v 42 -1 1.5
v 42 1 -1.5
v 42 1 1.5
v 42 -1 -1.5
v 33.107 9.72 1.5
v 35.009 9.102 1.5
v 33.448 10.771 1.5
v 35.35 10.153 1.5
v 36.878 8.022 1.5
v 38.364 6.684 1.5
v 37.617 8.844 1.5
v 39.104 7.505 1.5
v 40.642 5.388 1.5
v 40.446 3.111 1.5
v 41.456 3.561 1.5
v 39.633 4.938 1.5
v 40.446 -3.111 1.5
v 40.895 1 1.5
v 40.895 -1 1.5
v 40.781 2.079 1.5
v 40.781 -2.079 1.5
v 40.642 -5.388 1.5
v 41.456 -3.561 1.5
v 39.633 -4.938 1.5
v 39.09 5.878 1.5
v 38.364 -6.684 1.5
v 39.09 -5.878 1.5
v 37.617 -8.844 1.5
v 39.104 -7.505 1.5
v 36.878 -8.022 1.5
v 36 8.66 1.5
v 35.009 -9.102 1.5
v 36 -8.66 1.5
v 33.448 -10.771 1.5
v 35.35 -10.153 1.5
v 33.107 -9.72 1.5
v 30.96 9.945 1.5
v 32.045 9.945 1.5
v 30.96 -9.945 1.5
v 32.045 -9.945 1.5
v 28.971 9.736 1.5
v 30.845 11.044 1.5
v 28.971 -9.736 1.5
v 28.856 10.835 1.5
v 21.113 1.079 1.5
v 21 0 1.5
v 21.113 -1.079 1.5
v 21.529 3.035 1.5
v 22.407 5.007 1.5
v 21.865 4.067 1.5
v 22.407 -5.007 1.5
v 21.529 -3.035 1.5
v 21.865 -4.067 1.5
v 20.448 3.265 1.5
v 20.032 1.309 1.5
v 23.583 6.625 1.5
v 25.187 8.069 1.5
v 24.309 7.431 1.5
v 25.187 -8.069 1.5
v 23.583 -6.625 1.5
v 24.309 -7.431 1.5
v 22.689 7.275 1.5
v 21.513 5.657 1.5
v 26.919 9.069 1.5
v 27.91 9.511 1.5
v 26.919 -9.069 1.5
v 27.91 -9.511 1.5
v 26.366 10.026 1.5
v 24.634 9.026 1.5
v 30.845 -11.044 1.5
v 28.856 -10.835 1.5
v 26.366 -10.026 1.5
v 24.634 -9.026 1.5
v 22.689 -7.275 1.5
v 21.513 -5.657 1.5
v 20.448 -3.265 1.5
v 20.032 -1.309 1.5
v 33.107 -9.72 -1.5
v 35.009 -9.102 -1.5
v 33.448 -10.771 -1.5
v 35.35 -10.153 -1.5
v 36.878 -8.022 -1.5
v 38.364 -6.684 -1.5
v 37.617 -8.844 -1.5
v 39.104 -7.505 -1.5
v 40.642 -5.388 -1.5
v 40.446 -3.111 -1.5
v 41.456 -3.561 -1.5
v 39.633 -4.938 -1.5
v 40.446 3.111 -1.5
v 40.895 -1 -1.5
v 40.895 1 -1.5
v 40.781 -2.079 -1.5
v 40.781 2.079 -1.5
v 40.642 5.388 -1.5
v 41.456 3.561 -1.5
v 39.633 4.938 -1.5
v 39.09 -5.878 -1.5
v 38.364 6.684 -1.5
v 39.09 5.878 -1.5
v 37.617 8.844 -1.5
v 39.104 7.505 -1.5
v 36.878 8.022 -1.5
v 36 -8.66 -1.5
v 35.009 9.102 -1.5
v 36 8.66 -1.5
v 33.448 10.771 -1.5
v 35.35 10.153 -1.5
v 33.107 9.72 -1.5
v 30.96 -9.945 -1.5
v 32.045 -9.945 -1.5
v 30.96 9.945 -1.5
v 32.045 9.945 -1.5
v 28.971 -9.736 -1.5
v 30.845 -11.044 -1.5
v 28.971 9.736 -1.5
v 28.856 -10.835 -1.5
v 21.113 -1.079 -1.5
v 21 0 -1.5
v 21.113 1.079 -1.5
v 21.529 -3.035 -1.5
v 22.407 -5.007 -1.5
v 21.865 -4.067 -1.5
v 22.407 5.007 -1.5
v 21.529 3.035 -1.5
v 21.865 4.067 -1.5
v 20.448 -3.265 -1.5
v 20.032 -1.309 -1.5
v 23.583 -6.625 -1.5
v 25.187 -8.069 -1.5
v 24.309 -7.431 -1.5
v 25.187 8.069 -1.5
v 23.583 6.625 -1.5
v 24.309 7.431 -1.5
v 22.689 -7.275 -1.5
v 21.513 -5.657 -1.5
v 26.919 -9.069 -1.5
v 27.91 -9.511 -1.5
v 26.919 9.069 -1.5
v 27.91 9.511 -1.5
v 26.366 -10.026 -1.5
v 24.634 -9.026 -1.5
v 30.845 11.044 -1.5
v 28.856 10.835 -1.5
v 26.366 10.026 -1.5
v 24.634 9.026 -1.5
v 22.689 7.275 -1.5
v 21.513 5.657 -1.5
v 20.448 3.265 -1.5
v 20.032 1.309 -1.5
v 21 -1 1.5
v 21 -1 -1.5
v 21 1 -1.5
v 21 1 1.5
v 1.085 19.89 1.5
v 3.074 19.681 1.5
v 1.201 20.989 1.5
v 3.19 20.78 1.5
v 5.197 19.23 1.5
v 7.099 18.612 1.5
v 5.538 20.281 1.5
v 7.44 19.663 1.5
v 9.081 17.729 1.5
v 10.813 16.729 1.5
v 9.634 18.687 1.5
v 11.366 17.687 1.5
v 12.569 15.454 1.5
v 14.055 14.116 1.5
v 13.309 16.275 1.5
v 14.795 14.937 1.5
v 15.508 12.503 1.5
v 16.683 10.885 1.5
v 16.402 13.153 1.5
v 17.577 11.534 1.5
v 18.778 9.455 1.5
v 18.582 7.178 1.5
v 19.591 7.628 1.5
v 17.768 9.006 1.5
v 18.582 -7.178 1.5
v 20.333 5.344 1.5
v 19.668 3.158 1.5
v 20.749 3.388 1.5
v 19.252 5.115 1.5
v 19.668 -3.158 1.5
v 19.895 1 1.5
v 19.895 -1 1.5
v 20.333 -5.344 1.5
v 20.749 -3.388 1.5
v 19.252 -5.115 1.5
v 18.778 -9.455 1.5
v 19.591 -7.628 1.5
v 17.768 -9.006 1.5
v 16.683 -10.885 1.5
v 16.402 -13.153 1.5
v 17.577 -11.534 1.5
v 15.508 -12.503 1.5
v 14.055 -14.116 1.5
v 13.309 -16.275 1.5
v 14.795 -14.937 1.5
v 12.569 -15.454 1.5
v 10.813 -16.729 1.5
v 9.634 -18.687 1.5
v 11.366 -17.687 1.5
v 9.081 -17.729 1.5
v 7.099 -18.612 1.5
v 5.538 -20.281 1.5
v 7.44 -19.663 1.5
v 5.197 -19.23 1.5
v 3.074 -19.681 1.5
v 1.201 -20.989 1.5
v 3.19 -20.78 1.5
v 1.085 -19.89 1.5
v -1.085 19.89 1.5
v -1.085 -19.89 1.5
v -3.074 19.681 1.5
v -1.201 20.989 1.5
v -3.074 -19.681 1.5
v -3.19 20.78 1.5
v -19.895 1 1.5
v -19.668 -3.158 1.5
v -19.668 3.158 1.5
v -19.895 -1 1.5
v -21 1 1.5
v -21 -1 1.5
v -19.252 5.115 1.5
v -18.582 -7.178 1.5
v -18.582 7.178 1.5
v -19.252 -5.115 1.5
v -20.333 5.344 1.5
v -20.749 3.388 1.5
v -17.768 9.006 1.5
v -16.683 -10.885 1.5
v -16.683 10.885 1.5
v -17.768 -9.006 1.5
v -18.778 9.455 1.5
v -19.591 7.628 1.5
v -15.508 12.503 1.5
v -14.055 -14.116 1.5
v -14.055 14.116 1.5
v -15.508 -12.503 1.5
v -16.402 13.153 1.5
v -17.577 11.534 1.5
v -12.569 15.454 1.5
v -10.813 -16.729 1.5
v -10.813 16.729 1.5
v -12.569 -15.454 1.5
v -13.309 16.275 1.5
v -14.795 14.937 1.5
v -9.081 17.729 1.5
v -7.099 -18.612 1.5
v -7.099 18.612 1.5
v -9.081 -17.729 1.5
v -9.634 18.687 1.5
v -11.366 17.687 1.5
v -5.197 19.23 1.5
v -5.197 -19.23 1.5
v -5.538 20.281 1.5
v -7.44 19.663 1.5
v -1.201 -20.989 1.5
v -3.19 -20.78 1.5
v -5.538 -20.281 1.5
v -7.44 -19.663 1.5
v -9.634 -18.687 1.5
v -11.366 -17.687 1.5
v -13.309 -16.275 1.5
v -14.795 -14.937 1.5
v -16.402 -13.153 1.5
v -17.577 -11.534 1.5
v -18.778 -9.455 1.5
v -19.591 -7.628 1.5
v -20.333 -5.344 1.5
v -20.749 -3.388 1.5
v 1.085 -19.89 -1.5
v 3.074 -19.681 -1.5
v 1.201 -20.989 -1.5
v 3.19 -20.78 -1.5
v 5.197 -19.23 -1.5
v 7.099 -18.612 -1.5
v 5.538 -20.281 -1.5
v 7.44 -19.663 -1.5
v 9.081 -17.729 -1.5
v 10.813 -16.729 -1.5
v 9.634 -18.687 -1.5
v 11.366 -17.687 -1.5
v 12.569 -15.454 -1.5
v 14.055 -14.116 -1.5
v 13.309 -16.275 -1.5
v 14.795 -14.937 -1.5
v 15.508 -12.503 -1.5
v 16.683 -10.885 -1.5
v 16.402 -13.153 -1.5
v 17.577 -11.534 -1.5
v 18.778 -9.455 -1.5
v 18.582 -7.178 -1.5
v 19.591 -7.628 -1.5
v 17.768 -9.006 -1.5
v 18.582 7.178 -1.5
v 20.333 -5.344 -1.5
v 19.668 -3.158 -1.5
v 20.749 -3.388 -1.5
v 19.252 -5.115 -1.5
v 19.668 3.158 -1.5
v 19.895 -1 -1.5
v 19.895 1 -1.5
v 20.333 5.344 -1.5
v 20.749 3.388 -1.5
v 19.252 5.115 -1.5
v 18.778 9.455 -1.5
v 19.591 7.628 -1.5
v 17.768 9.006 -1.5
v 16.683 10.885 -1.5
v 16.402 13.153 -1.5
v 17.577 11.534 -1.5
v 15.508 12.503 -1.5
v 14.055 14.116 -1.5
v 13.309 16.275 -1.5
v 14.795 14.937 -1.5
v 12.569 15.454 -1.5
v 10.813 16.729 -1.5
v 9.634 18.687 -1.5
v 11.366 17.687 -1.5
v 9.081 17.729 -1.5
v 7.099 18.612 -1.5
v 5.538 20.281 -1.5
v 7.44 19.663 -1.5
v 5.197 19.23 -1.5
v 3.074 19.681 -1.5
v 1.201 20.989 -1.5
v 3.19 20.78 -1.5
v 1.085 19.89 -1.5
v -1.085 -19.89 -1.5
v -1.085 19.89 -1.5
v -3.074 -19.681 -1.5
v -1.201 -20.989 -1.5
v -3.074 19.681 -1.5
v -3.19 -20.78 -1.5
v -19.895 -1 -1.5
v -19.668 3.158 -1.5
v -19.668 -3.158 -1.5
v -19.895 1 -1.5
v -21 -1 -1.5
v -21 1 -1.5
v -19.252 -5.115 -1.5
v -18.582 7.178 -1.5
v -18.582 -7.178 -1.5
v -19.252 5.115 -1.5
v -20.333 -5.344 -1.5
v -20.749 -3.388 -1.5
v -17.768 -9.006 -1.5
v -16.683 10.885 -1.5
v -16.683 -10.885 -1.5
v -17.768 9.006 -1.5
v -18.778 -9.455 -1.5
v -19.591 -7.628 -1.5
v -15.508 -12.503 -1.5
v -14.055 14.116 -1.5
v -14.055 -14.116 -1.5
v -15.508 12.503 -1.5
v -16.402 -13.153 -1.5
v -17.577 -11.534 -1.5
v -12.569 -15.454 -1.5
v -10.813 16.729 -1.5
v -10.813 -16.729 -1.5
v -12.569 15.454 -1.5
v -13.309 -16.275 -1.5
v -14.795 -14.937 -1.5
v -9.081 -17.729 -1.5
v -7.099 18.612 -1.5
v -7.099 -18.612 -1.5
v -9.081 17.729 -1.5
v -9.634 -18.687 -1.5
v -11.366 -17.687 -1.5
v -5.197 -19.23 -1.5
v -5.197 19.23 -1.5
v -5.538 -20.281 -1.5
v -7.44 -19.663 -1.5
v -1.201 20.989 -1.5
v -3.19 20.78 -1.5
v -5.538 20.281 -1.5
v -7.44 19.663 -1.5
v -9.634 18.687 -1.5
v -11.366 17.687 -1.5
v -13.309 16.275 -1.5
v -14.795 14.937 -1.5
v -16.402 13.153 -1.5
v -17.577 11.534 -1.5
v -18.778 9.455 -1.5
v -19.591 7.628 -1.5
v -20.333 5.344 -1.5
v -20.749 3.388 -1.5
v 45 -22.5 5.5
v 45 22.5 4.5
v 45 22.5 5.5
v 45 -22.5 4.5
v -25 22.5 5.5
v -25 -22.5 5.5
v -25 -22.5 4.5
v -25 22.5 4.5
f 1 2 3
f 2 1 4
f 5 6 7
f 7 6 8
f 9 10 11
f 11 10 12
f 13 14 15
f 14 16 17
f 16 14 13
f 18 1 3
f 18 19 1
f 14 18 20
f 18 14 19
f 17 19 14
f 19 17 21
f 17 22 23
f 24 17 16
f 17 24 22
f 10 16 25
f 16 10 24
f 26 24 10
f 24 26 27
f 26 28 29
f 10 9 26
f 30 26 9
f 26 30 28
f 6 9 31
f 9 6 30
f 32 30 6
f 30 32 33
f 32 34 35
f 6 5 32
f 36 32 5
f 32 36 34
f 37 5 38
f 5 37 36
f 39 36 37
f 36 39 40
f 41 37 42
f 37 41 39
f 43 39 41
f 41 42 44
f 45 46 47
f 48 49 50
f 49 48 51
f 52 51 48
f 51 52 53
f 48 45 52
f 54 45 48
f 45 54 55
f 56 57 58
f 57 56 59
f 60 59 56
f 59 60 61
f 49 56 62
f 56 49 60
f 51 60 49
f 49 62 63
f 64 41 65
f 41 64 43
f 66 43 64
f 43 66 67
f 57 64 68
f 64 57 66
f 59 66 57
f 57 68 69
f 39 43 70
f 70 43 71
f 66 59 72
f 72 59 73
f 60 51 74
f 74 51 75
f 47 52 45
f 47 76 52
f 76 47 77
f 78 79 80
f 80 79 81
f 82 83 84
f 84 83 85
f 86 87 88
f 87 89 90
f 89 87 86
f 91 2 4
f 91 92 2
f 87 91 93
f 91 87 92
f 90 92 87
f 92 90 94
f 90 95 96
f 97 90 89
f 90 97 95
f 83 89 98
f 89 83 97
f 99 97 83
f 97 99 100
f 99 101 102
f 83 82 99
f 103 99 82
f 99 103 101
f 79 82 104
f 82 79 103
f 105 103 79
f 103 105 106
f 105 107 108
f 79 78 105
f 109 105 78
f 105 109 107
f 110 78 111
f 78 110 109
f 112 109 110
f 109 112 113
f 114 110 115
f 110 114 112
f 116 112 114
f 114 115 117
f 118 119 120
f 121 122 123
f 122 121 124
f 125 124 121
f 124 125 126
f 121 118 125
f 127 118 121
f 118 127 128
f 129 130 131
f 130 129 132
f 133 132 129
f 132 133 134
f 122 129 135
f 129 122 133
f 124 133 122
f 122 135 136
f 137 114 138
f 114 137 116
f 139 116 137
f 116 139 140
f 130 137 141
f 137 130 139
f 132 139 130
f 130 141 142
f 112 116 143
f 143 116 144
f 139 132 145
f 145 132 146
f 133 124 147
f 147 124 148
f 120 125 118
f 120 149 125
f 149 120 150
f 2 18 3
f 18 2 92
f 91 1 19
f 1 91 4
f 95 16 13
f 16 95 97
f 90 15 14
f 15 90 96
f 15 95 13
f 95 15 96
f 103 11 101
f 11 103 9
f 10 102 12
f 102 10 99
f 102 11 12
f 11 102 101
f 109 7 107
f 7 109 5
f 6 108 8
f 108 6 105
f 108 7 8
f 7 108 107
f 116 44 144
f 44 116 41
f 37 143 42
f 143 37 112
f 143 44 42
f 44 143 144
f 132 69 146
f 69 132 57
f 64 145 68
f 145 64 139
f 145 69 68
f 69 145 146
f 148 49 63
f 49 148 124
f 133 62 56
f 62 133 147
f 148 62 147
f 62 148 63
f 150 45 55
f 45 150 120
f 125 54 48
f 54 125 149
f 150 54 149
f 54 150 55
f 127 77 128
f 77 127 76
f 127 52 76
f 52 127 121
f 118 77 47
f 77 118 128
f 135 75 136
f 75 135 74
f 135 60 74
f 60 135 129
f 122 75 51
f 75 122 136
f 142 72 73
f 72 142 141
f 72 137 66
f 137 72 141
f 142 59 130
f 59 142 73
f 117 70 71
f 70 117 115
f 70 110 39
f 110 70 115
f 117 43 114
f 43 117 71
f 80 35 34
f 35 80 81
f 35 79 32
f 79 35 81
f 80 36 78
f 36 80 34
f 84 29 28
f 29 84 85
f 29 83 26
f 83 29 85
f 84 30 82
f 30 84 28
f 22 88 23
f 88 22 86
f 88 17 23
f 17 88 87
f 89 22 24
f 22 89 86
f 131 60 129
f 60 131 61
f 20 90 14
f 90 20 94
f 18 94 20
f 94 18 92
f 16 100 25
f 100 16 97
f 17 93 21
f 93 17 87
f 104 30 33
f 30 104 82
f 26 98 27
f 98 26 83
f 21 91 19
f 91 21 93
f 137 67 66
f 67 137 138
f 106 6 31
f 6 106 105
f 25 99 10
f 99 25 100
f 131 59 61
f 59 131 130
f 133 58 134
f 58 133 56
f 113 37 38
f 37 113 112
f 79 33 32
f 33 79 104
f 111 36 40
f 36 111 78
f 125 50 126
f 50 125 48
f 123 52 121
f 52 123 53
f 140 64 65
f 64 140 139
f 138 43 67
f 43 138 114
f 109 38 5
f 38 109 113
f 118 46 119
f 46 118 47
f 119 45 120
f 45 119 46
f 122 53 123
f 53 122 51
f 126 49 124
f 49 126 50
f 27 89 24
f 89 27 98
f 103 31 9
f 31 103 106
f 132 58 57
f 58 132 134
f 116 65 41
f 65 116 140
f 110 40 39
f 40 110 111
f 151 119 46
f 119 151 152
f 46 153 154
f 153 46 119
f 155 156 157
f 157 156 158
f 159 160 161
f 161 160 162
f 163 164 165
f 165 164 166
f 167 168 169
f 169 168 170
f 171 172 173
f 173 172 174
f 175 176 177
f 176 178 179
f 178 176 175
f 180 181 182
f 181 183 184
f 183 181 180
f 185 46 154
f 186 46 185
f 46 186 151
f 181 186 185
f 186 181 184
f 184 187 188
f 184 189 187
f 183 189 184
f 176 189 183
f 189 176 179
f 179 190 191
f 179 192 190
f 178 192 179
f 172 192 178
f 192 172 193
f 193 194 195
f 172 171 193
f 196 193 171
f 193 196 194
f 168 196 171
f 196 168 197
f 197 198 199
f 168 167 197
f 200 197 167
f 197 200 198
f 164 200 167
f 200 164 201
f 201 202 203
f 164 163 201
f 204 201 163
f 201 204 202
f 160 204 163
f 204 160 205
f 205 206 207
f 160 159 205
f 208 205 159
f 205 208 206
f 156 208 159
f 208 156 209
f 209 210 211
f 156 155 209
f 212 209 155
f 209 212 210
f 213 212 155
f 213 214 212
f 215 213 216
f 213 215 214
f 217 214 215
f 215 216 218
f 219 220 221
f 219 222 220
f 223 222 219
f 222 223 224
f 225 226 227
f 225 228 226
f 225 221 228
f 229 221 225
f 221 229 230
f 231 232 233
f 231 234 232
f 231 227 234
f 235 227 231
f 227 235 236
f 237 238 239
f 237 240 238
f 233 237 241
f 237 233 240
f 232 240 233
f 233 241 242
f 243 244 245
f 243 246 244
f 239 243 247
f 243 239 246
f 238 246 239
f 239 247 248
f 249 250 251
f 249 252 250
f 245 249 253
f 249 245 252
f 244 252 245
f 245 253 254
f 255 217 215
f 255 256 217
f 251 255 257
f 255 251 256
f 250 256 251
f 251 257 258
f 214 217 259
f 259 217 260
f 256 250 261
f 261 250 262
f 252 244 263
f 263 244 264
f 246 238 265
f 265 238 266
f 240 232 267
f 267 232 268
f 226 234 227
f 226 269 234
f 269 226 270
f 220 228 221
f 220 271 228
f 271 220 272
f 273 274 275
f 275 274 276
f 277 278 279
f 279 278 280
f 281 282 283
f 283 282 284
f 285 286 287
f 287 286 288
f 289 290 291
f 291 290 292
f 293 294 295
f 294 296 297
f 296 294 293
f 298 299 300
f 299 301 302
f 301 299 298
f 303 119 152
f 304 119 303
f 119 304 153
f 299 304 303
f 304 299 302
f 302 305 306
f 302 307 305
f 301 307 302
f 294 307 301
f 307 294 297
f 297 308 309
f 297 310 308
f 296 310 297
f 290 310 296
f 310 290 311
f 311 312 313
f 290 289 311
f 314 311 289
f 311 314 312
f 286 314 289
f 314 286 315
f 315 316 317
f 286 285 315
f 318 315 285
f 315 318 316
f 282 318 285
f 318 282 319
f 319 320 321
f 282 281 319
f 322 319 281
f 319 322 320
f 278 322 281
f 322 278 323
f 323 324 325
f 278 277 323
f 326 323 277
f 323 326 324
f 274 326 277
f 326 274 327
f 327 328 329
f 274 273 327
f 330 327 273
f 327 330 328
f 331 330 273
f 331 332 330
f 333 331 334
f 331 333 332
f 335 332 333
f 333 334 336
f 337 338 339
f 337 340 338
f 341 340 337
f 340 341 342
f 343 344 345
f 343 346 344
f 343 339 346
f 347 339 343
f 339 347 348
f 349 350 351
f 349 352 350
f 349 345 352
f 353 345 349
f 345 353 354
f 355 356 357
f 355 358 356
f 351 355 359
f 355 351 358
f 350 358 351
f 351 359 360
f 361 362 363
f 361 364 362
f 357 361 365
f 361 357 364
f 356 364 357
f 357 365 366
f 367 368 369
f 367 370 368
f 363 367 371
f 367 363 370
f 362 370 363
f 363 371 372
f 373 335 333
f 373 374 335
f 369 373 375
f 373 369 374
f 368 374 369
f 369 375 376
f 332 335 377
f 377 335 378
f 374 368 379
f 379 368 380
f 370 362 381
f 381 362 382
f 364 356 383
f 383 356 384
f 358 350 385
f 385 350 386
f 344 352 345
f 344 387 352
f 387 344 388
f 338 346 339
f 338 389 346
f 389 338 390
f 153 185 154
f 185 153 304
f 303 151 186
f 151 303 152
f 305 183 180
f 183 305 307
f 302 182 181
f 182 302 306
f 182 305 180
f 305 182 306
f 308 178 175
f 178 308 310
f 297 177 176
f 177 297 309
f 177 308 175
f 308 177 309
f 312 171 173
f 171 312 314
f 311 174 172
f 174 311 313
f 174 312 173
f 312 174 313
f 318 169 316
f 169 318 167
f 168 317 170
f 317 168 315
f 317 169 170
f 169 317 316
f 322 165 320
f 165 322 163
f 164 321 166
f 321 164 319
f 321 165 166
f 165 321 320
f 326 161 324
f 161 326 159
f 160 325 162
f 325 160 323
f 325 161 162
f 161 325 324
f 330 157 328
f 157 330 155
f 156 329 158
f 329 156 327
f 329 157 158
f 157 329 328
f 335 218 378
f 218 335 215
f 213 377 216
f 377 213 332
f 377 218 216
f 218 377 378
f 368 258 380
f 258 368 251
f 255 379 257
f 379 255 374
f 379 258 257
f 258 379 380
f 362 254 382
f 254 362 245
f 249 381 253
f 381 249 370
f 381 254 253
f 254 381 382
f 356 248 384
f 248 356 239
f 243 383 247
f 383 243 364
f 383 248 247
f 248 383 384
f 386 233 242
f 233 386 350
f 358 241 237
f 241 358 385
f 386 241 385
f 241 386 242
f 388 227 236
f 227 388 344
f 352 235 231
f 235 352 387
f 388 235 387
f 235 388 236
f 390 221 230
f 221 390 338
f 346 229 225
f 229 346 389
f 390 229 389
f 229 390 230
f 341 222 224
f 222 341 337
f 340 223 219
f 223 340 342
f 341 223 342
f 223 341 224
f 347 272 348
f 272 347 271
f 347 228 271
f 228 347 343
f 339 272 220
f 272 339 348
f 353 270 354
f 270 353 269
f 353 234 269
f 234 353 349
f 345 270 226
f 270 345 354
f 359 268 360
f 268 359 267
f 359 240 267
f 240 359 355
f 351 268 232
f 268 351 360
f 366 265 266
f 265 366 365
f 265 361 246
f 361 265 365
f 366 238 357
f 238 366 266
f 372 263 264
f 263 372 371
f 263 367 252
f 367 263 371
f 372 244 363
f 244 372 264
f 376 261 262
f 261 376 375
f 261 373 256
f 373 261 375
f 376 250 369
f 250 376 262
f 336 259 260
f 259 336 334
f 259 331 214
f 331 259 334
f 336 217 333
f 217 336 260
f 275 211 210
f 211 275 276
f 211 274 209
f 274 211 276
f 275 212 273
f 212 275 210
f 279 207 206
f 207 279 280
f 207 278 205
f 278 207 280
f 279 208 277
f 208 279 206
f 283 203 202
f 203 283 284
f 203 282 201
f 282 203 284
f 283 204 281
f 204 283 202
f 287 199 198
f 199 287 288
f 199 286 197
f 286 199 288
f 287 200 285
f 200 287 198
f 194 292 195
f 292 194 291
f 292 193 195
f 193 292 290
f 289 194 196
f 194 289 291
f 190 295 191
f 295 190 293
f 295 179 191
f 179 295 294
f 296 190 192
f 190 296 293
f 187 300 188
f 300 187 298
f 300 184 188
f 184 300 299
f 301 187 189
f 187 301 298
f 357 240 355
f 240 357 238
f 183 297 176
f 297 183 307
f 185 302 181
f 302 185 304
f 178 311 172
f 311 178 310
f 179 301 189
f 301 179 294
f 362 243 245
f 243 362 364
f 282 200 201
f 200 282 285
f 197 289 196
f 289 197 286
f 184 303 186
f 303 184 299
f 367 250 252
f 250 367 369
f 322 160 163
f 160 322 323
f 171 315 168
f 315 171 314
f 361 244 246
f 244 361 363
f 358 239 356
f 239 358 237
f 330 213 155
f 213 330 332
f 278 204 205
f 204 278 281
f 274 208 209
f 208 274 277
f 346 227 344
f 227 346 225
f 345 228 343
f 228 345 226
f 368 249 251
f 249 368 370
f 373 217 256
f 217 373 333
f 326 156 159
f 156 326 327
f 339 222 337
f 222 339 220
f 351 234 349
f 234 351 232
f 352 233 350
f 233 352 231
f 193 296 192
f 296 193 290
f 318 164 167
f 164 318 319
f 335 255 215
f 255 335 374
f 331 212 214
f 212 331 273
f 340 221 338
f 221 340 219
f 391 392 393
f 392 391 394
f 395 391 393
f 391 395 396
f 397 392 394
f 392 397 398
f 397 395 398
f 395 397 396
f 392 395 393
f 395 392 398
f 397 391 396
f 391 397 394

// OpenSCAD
module Gear(depth, radius_top, radius_bottom, cog_n)
{
	//cog_angle = atan(abs(radius_bottom-radius_top)/depth);
	//echo(cog_angle);
	//rotate([0,-cog_angle,0])
	cog_pos = radius_bottom > radius_top ? radius_bottom : radius_top;

	for(angle = [0:360/cog_n:360])
	{
		rotate([0,0,angle])
		translate([cog_pos,0,0])
		cube([2,2,depth], center=true);
	}

	cylinder(depth,radius_bottom,radius_top, center=true);
}

module Box(width, height, depth, th)
{
	difference()
	{
		cube([width, height,depth], center=true);

		translate([0,0,(th/2)+0.1])
		cube([width-(2*th), height-(2*th), depth-th], center=true);
	}
}

/*
// input
translate([31,0,0])rotate([0,0,-($t*2)*360])color("Blue")Gear(3,10,10,15);

// second set
translate([0,0,3])rotate([0,0,$t*360])color("Salmon")Gear(3,10,10,15);
rotate([0,0,$t*360])color("Red")Gear(3,20,20,30);

// third set
translate([-31,0,3])rotate([0,0,-($t/2)*360])color("Green")Gear(3,20,20,30);
translate([-31,0,20])rotate([0,0,-($t/2)*360])color("DarkGreen")Gear(3,10,10,15);
translate([-31,0,12])rotate([0,0,-($t/2)*360])color("Green")cylinder(20,2,2,center=true);

// radial gear set
translate([-21,0,31.5])rotate([0,90,0])rotate([0,0,-10-($t/2)*360])color("Yellow")Gear(3,10,10,15);
*/


translate([31,0,0])rotate([0,0,-($t*2)*360])color("Blue")Gear(3,10,10,15);

//rotate([0,0,$t*360])translate([0,0,8])cube([3,3,20], center=true);
rotate([0,0,$t*360])color("Red")Gear(3,20,20,30);

%translate([10,0,0])Box(70,45,10,1);
translate([10,0,5])cube([70,45,1], center=true);
